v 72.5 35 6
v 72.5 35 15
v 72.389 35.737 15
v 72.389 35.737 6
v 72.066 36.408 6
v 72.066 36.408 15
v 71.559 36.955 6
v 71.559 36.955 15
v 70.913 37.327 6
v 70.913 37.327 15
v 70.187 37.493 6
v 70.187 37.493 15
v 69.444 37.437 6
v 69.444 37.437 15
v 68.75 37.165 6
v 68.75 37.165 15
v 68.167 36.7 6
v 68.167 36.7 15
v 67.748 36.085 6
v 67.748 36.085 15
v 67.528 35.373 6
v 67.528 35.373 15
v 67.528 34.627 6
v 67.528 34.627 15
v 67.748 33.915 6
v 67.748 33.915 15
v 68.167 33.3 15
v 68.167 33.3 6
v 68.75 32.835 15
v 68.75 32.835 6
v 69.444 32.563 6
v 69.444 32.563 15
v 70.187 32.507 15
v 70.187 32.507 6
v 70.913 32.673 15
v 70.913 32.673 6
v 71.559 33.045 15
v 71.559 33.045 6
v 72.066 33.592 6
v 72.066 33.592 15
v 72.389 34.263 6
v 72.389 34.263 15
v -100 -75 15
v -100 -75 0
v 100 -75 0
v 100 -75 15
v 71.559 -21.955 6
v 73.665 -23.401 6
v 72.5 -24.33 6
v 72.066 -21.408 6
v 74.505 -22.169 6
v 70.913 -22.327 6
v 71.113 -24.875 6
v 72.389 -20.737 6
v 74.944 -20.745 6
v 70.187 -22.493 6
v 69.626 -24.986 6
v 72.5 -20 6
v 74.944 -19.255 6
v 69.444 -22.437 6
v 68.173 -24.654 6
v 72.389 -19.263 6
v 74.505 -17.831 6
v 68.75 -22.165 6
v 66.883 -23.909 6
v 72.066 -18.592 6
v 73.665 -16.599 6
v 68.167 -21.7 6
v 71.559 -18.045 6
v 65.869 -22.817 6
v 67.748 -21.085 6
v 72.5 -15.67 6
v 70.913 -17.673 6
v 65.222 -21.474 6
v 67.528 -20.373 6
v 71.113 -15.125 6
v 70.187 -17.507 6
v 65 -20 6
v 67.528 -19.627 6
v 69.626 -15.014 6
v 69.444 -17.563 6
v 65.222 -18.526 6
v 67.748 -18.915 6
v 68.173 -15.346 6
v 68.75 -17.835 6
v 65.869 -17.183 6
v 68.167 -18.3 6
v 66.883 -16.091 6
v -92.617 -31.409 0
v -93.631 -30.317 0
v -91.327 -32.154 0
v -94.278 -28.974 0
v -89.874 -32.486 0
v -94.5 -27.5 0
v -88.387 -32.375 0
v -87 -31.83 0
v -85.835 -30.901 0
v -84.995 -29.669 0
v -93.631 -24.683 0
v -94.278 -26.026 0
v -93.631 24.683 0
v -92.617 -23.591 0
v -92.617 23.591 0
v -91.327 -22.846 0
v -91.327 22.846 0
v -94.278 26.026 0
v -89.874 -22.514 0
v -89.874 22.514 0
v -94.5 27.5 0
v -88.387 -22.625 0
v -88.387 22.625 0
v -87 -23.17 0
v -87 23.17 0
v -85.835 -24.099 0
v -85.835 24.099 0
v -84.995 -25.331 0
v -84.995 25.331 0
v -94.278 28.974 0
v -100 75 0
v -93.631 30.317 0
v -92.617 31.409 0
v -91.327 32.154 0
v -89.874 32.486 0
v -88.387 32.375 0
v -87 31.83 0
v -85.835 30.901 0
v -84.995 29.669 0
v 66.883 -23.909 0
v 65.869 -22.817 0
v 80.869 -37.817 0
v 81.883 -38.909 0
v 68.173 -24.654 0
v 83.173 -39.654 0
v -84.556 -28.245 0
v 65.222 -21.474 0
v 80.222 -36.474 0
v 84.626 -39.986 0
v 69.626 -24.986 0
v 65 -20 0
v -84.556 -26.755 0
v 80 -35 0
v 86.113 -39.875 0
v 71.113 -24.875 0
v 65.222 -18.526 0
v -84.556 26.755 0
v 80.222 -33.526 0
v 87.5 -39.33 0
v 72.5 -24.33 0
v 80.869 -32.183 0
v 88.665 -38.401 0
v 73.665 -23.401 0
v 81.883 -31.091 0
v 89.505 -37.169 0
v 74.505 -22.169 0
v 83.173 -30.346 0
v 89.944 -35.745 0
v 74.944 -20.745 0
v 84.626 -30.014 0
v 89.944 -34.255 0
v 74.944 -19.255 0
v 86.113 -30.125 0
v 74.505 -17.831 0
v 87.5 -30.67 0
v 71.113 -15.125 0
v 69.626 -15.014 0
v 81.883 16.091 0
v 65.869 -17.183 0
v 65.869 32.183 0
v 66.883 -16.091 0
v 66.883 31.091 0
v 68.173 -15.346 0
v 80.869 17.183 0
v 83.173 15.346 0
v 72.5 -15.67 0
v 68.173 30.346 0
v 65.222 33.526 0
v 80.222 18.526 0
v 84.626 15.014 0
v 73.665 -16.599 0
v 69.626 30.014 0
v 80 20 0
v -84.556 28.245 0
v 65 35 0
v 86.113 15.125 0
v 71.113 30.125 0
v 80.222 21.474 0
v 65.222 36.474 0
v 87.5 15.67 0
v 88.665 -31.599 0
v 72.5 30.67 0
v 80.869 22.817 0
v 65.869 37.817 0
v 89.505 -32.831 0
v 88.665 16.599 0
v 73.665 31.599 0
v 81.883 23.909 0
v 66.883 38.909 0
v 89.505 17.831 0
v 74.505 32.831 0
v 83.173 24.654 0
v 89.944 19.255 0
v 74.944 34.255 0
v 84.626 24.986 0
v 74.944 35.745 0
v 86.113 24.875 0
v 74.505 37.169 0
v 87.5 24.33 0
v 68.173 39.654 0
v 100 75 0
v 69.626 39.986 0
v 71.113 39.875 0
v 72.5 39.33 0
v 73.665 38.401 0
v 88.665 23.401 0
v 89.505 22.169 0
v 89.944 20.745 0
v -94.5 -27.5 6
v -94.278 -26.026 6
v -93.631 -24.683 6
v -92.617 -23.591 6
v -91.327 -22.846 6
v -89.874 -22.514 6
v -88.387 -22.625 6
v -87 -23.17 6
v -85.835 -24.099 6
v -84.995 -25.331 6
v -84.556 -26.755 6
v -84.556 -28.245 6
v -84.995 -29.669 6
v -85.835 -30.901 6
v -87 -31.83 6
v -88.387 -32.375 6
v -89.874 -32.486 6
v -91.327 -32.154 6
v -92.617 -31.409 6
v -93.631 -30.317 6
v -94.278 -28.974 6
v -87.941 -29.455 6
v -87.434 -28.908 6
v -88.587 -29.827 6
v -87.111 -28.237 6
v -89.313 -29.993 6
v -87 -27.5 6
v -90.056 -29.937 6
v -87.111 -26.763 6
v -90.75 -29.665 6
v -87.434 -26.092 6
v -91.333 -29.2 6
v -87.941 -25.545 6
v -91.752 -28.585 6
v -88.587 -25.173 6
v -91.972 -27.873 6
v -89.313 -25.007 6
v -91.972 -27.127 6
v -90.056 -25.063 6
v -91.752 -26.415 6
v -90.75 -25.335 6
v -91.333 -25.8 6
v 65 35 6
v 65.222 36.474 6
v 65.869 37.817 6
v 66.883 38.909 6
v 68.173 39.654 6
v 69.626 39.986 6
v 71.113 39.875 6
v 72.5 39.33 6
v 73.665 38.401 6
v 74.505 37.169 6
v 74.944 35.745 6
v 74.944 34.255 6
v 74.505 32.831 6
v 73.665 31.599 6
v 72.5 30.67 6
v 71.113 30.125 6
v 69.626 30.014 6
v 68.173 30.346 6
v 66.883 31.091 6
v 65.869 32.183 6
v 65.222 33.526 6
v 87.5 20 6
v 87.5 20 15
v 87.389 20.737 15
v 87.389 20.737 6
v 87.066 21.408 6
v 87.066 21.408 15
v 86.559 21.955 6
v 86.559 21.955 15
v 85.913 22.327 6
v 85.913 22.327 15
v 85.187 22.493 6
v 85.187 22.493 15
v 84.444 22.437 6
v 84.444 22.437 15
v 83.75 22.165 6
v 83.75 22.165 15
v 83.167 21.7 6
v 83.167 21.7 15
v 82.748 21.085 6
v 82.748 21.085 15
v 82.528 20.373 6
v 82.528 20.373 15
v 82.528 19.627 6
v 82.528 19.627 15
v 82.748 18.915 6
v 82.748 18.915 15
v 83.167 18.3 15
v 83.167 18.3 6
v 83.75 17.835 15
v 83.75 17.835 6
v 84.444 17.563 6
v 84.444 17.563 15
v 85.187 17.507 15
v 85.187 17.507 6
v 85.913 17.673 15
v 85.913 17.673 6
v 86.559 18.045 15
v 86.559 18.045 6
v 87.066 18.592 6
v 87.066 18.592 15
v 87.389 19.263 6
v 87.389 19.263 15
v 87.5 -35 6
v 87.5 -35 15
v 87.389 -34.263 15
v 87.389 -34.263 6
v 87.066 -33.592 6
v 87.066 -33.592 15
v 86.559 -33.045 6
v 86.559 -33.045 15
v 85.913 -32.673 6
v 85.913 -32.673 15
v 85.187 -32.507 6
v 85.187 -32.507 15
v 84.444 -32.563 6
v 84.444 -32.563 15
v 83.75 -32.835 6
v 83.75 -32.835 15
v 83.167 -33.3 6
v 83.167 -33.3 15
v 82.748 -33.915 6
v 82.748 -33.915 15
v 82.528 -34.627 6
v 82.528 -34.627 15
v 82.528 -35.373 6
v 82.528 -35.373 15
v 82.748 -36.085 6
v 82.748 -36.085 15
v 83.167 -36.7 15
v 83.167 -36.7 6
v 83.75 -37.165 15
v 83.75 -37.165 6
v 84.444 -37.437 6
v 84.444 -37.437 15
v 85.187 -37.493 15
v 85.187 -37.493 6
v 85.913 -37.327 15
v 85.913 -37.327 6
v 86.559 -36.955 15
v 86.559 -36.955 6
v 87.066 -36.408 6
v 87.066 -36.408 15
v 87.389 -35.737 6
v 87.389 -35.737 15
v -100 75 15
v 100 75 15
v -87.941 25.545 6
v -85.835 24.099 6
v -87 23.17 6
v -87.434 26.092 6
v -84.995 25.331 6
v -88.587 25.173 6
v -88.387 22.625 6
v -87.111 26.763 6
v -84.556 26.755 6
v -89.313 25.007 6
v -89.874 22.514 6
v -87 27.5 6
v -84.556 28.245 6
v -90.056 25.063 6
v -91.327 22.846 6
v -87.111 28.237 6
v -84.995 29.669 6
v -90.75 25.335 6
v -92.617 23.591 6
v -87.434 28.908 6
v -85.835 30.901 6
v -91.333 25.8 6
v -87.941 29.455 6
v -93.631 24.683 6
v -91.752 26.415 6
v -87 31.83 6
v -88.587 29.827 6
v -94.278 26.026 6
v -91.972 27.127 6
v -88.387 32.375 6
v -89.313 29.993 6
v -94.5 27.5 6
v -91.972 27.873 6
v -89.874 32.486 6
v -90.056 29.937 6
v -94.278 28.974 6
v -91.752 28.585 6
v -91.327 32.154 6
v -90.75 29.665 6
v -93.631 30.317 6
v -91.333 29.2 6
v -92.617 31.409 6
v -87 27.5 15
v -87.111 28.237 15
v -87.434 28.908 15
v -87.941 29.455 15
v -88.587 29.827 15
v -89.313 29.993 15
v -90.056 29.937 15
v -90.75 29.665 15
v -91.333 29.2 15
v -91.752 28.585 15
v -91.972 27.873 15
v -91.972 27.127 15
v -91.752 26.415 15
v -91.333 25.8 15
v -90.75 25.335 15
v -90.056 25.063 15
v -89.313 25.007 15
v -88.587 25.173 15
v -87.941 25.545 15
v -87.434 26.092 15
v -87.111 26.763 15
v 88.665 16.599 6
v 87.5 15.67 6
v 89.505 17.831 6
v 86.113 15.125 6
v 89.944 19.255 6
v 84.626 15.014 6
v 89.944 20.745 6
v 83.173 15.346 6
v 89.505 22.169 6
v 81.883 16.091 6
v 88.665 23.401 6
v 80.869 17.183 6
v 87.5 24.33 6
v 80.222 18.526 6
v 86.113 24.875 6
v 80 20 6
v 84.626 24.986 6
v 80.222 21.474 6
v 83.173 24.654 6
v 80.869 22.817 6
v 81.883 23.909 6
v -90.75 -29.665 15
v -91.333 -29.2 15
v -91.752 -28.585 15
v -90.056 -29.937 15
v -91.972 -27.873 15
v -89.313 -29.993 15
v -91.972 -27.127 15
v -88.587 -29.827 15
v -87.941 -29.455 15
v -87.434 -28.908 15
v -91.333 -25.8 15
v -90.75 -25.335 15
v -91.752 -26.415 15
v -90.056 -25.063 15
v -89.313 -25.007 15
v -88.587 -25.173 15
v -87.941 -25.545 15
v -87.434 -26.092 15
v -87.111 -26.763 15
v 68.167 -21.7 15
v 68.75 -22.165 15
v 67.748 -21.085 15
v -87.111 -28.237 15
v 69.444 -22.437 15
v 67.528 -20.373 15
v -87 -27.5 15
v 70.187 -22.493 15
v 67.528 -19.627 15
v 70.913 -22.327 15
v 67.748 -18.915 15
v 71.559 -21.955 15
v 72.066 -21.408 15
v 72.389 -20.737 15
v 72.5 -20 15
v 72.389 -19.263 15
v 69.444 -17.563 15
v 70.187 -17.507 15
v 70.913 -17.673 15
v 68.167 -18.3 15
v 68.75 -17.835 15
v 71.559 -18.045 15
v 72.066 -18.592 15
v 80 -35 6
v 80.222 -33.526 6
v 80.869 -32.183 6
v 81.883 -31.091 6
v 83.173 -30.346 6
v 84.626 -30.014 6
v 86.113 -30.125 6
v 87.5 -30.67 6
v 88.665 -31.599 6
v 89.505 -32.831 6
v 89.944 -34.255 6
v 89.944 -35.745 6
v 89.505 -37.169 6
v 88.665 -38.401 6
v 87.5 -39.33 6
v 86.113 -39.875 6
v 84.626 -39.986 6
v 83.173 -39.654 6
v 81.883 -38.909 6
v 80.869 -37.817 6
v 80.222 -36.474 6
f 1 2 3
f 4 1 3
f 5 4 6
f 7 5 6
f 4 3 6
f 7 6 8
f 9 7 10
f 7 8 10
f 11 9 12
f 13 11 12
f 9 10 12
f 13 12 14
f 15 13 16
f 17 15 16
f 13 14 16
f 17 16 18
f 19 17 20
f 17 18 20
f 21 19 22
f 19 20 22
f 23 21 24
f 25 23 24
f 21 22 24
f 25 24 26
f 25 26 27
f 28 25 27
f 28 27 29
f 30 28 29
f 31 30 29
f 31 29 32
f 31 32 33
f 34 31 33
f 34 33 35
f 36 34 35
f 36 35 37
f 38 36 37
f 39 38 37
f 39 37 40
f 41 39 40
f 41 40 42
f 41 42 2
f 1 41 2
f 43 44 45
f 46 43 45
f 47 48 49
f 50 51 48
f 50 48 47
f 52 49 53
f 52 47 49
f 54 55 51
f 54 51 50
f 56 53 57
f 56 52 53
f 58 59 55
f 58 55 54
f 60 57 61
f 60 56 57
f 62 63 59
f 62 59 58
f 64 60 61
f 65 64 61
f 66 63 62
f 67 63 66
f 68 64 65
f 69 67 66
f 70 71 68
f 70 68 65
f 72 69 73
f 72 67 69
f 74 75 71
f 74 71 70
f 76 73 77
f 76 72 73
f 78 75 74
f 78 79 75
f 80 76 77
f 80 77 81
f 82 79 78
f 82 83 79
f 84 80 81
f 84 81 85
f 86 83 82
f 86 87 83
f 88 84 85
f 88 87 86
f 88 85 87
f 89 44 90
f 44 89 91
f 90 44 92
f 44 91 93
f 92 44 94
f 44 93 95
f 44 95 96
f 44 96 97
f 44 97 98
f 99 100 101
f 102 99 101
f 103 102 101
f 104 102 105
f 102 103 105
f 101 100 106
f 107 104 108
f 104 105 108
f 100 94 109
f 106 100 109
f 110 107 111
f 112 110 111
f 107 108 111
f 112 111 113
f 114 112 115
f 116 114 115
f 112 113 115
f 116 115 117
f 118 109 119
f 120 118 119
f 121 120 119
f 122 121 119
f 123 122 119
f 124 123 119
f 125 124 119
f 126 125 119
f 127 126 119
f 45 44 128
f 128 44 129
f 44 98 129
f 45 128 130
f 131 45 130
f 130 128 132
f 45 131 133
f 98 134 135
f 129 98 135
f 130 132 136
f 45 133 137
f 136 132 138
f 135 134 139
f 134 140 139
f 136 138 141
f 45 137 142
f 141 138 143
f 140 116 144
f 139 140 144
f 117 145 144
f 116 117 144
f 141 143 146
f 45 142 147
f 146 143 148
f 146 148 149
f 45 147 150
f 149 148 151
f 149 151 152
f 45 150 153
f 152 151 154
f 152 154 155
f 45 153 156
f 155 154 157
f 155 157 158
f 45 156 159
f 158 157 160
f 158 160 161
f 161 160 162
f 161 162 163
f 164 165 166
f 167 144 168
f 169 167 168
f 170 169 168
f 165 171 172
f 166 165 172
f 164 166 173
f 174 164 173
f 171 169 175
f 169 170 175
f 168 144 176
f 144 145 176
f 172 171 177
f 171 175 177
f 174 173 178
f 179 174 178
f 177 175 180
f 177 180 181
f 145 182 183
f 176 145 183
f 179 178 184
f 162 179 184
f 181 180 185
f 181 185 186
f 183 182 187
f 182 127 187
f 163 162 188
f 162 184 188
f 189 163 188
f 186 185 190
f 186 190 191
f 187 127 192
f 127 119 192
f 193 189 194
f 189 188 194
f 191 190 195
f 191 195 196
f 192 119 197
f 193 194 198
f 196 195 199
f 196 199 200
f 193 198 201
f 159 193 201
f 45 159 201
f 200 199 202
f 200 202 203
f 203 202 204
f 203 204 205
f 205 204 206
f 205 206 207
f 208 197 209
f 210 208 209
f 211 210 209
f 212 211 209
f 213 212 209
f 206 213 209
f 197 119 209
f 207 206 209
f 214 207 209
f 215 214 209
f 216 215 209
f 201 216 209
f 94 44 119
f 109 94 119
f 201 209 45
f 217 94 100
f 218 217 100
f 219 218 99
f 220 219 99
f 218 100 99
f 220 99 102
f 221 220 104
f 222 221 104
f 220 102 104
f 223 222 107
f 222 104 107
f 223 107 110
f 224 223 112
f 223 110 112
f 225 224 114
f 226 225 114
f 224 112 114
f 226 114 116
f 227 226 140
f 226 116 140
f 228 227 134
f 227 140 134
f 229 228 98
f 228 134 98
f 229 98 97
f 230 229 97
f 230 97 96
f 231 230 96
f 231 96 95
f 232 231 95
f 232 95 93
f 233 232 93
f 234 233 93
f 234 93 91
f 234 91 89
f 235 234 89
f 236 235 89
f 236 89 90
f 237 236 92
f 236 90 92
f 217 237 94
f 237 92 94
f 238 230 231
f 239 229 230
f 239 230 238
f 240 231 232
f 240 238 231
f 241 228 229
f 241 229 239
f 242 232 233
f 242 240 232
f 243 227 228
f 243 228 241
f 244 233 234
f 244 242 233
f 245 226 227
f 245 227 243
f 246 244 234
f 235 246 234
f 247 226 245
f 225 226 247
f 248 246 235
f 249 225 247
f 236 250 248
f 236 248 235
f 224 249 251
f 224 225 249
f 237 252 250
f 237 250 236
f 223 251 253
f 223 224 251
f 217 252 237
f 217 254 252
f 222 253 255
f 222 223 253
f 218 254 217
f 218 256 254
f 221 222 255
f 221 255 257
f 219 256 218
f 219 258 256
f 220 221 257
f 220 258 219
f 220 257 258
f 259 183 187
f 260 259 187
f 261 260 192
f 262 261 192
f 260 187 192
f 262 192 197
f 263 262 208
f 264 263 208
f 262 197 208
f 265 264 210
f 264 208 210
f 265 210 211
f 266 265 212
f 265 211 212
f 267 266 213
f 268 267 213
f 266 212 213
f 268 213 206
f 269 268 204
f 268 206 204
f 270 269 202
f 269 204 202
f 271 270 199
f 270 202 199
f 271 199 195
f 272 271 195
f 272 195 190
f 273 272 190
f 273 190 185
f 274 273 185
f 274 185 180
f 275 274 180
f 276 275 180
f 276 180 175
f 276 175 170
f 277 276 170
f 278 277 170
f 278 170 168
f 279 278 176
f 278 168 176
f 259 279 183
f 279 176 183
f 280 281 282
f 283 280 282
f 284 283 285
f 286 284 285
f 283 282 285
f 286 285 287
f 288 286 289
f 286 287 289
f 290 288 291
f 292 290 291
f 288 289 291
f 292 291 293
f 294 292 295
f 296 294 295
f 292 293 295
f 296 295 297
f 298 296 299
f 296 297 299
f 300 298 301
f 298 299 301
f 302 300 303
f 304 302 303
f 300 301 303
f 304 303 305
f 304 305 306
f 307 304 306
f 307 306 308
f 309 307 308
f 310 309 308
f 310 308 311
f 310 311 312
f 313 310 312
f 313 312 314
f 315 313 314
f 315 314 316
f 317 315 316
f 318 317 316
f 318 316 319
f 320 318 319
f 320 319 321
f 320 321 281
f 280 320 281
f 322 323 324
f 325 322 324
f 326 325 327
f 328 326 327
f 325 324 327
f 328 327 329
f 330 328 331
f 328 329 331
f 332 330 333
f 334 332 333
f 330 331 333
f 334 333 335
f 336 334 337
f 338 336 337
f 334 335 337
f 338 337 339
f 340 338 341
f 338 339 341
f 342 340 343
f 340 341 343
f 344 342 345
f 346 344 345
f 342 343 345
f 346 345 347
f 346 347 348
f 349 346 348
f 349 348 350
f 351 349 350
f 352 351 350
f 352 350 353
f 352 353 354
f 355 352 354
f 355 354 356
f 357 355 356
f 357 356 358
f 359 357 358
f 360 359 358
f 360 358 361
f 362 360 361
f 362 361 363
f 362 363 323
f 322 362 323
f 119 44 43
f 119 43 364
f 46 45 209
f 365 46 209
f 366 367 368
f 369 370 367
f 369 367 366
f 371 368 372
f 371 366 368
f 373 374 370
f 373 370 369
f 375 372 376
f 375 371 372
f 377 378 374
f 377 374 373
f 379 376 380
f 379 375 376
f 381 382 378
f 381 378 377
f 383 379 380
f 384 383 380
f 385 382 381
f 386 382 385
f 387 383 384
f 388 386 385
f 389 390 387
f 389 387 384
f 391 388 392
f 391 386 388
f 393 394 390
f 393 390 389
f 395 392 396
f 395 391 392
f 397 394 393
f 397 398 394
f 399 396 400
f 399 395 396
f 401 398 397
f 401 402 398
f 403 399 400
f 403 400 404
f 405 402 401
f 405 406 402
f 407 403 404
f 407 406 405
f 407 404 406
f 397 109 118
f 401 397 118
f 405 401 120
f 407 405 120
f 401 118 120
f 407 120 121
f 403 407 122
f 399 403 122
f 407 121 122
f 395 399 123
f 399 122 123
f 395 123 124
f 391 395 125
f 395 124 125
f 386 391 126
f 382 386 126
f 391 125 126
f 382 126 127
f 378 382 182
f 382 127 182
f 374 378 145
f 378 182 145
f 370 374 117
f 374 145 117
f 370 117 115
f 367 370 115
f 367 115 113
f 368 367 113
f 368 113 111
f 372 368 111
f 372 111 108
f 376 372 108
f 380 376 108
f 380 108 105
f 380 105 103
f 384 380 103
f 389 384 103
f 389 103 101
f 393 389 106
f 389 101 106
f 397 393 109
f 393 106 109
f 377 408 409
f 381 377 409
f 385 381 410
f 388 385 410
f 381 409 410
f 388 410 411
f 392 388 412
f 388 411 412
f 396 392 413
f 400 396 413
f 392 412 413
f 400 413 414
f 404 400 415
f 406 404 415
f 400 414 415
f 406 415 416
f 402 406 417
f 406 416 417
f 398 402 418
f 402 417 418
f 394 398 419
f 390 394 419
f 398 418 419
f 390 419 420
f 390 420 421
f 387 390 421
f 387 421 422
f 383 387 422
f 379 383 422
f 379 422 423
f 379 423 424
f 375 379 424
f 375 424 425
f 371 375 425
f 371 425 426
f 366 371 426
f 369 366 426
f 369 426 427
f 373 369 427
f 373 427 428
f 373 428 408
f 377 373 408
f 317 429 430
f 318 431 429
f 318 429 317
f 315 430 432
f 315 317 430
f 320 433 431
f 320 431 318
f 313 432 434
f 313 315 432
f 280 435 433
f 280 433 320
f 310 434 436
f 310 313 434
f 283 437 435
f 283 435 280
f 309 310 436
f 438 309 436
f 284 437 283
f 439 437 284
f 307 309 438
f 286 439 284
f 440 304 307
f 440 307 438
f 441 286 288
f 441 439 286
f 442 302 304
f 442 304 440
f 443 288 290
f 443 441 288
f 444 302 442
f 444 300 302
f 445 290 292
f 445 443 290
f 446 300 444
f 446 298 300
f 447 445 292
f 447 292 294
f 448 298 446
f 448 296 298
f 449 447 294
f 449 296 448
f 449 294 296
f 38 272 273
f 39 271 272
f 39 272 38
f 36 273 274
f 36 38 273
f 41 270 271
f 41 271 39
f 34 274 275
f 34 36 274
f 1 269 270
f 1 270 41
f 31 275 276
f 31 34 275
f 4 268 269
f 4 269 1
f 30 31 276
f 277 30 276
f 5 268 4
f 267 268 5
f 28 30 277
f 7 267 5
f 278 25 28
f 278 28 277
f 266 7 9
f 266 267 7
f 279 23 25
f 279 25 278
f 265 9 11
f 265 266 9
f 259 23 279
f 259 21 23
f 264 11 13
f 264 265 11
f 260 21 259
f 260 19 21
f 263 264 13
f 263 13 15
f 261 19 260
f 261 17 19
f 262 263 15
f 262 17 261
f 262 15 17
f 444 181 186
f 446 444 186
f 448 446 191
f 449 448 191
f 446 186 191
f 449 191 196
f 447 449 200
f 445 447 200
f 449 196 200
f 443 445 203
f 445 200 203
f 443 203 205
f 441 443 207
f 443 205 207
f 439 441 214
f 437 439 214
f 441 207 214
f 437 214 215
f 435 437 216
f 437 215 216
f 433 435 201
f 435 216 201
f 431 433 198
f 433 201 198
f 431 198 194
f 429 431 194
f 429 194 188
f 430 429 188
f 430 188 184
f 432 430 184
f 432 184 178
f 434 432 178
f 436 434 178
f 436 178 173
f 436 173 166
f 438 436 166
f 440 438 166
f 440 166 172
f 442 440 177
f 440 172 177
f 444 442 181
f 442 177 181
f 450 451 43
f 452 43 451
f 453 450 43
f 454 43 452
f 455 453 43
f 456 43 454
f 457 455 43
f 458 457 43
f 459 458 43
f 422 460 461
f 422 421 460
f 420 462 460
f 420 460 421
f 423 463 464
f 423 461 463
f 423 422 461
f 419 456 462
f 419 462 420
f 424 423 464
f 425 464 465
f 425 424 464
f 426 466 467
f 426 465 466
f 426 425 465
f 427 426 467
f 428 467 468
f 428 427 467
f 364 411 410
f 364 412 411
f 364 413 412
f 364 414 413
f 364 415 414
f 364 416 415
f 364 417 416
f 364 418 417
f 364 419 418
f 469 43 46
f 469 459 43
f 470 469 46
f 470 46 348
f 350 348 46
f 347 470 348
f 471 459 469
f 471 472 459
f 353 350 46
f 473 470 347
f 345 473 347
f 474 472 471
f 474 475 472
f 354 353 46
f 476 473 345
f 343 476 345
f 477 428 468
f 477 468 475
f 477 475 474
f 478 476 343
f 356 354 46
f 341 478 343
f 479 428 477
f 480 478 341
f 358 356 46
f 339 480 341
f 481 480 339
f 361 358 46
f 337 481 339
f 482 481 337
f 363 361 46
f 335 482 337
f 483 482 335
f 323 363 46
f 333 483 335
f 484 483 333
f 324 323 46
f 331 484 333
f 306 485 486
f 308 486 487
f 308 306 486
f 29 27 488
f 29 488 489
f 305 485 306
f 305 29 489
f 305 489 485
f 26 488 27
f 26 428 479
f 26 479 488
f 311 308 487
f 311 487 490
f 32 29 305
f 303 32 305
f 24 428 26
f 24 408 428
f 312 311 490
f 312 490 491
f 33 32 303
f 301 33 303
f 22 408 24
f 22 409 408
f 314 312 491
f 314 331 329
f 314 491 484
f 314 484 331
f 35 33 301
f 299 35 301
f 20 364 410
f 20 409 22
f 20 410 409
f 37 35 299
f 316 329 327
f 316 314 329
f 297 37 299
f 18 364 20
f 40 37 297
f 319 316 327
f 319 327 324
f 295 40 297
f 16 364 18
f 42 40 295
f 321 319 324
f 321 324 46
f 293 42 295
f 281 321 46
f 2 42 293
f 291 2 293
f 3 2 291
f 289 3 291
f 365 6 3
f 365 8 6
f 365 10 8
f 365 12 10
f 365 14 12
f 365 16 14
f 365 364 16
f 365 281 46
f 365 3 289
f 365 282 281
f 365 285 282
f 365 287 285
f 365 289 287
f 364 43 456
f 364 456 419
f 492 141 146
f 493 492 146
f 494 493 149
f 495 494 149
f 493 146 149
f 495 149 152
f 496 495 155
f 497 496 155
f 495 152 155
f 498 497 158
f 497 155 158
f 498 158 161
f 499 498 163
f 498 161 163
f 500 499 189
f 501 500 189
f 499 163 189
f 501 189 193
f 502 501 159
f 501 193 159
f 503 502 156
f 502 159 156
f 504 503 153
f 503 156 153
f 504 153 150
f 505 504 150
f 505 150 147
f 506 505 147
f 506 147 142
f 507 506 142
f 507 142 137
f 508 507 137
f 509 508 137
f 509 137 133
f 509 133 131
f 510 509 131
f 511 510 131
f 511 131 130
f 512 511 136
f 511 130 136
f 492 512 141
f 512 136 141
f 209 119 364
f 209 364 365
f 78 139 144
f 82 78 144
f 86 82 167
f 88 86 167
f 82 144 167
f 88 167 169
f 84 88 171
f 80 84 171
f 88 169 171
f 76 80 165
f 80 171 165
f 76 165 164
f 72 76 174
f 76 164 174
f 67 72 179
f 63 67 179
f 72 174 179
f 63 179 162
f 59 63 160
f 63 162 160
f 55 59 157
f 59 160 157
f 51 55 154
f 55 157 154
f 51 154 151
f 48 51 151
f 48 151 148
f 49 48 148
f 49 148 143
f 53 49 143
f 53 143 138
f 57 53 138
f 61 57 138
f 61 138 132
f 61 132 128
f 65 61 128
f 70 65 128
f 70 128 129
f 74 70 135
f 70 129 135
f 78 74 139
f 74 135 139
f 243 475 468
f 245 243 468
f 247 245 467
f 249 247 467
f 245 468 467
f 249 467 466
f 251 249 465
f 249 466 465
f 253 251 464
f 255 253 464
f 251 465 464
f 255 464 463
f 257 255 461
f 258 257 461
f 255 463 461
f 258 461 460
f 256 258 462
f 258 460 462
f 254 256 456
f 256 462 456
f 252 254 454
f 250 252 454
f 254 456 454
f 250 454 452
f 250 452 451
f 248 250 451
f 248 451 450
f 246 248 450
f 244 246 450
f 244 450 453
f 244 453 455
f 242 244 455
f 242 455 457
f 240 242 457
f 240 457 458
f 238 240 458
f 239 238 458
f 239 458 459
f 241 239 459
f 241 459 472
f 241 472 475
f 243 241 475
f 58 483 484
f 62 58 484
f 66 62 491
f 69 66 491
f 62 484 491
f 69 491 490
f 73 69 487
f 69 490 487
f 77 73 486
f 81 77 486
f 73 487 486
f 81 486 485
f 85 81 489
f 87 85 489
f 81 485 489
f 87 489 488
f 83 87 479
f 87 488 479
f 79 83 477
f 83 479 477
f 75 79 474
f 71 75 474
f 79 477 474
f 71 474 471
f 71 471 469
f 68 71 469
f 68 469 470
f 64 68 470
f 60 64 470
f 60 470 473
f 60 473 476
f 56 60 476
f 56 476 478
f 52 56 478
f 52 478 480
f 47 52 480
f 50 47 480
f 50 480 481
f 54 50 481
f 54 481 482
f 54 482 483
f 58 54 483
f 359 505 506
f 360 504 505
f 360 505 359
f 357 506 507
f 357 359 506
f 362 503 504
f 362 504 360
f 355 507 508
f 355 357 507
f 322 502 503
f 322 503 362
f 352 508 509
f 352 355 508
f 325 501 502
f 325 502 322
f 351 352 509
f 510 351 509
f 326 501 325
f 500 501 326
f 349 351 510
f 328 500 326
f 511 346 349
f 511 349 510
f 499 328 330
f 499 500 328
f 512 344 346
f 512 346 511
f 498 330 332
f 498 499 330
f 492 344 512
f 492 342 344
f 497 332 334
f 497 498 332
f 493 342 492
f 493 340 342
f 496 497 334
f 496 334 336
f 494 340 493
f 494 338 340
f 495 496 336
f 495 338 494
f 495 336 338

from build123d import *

# Parameters (mm, degrees)
SKETCH1_W           = 200
SKETCH1_H           = 150
BOSS_EXTRUDE1_DEPTH = 15
SKETCH2_R           = 2.5
CUT_EXTRUDE1_DEPTH  = 126.89678312
SKETCH3_R           = 5
CUT_EXTRUDE2_DEPTH  = 6


with BuildPart() as part:
    # Sketch1 → Boss-Extrude1 (new body)
    with BuildSketch(Plane.XY):
        Rectangle(SKETCH1_W, SKETCH1_H)
    extrude(amount=BOSS_EXTRUDE1_DEPTH)

    # Sketch2 → Cut-Extrude1 (cut, through all)
    with BuildSketch(Plane.XY.offset(15)):
        with Locations((85, -35)):
            Circle(SKETCH2_R)
        with Locations((70, -20)):
            Circle(SKETCH2_R)
        with Locations((85, 20)):
            Circle(SKETCH2_R)
        with Locations((70, 35)):
            Circle(SKETCH2_R)
        with Locations((-89.5, 27.5)):
            Circle(SKETCH2_R)
        with Locations((-89.5, -27.5)):
            Circle(SKETCH2_R)
    extrude(amount=-CUT_EXTRUDE1_DEPTH, mode=Mode.SUBTRACT)

    # Sketch3 → Cut-Extrude2 (cut)
    with BuildSketch(Plane(origin=(0, 0, 0), x_dir=(-1, 0, 0), z_dir=(0, 0, -1))):
        with Locations((-70, 35)):
            Circle(SKETCH3_R)
        with Locations((-85, 20)):
            Circle(SKETCH3_R)
        with Locations((-70, -20)):
            Circle(SKETCH3_R)
        with Locations((-85, -35)):
            Circle(SKETCH3_R)
        with Locations((89.5, -27.5)):
            Circle(SKETCH3_R)
        with Locations((89.5, 27.5)):
            Circle(SKETCH3_R)
    extrude(amount=-CUT_EXTRUDE2_DEPTH, mode=Mode.SUBTRACT)


solid = part.part
